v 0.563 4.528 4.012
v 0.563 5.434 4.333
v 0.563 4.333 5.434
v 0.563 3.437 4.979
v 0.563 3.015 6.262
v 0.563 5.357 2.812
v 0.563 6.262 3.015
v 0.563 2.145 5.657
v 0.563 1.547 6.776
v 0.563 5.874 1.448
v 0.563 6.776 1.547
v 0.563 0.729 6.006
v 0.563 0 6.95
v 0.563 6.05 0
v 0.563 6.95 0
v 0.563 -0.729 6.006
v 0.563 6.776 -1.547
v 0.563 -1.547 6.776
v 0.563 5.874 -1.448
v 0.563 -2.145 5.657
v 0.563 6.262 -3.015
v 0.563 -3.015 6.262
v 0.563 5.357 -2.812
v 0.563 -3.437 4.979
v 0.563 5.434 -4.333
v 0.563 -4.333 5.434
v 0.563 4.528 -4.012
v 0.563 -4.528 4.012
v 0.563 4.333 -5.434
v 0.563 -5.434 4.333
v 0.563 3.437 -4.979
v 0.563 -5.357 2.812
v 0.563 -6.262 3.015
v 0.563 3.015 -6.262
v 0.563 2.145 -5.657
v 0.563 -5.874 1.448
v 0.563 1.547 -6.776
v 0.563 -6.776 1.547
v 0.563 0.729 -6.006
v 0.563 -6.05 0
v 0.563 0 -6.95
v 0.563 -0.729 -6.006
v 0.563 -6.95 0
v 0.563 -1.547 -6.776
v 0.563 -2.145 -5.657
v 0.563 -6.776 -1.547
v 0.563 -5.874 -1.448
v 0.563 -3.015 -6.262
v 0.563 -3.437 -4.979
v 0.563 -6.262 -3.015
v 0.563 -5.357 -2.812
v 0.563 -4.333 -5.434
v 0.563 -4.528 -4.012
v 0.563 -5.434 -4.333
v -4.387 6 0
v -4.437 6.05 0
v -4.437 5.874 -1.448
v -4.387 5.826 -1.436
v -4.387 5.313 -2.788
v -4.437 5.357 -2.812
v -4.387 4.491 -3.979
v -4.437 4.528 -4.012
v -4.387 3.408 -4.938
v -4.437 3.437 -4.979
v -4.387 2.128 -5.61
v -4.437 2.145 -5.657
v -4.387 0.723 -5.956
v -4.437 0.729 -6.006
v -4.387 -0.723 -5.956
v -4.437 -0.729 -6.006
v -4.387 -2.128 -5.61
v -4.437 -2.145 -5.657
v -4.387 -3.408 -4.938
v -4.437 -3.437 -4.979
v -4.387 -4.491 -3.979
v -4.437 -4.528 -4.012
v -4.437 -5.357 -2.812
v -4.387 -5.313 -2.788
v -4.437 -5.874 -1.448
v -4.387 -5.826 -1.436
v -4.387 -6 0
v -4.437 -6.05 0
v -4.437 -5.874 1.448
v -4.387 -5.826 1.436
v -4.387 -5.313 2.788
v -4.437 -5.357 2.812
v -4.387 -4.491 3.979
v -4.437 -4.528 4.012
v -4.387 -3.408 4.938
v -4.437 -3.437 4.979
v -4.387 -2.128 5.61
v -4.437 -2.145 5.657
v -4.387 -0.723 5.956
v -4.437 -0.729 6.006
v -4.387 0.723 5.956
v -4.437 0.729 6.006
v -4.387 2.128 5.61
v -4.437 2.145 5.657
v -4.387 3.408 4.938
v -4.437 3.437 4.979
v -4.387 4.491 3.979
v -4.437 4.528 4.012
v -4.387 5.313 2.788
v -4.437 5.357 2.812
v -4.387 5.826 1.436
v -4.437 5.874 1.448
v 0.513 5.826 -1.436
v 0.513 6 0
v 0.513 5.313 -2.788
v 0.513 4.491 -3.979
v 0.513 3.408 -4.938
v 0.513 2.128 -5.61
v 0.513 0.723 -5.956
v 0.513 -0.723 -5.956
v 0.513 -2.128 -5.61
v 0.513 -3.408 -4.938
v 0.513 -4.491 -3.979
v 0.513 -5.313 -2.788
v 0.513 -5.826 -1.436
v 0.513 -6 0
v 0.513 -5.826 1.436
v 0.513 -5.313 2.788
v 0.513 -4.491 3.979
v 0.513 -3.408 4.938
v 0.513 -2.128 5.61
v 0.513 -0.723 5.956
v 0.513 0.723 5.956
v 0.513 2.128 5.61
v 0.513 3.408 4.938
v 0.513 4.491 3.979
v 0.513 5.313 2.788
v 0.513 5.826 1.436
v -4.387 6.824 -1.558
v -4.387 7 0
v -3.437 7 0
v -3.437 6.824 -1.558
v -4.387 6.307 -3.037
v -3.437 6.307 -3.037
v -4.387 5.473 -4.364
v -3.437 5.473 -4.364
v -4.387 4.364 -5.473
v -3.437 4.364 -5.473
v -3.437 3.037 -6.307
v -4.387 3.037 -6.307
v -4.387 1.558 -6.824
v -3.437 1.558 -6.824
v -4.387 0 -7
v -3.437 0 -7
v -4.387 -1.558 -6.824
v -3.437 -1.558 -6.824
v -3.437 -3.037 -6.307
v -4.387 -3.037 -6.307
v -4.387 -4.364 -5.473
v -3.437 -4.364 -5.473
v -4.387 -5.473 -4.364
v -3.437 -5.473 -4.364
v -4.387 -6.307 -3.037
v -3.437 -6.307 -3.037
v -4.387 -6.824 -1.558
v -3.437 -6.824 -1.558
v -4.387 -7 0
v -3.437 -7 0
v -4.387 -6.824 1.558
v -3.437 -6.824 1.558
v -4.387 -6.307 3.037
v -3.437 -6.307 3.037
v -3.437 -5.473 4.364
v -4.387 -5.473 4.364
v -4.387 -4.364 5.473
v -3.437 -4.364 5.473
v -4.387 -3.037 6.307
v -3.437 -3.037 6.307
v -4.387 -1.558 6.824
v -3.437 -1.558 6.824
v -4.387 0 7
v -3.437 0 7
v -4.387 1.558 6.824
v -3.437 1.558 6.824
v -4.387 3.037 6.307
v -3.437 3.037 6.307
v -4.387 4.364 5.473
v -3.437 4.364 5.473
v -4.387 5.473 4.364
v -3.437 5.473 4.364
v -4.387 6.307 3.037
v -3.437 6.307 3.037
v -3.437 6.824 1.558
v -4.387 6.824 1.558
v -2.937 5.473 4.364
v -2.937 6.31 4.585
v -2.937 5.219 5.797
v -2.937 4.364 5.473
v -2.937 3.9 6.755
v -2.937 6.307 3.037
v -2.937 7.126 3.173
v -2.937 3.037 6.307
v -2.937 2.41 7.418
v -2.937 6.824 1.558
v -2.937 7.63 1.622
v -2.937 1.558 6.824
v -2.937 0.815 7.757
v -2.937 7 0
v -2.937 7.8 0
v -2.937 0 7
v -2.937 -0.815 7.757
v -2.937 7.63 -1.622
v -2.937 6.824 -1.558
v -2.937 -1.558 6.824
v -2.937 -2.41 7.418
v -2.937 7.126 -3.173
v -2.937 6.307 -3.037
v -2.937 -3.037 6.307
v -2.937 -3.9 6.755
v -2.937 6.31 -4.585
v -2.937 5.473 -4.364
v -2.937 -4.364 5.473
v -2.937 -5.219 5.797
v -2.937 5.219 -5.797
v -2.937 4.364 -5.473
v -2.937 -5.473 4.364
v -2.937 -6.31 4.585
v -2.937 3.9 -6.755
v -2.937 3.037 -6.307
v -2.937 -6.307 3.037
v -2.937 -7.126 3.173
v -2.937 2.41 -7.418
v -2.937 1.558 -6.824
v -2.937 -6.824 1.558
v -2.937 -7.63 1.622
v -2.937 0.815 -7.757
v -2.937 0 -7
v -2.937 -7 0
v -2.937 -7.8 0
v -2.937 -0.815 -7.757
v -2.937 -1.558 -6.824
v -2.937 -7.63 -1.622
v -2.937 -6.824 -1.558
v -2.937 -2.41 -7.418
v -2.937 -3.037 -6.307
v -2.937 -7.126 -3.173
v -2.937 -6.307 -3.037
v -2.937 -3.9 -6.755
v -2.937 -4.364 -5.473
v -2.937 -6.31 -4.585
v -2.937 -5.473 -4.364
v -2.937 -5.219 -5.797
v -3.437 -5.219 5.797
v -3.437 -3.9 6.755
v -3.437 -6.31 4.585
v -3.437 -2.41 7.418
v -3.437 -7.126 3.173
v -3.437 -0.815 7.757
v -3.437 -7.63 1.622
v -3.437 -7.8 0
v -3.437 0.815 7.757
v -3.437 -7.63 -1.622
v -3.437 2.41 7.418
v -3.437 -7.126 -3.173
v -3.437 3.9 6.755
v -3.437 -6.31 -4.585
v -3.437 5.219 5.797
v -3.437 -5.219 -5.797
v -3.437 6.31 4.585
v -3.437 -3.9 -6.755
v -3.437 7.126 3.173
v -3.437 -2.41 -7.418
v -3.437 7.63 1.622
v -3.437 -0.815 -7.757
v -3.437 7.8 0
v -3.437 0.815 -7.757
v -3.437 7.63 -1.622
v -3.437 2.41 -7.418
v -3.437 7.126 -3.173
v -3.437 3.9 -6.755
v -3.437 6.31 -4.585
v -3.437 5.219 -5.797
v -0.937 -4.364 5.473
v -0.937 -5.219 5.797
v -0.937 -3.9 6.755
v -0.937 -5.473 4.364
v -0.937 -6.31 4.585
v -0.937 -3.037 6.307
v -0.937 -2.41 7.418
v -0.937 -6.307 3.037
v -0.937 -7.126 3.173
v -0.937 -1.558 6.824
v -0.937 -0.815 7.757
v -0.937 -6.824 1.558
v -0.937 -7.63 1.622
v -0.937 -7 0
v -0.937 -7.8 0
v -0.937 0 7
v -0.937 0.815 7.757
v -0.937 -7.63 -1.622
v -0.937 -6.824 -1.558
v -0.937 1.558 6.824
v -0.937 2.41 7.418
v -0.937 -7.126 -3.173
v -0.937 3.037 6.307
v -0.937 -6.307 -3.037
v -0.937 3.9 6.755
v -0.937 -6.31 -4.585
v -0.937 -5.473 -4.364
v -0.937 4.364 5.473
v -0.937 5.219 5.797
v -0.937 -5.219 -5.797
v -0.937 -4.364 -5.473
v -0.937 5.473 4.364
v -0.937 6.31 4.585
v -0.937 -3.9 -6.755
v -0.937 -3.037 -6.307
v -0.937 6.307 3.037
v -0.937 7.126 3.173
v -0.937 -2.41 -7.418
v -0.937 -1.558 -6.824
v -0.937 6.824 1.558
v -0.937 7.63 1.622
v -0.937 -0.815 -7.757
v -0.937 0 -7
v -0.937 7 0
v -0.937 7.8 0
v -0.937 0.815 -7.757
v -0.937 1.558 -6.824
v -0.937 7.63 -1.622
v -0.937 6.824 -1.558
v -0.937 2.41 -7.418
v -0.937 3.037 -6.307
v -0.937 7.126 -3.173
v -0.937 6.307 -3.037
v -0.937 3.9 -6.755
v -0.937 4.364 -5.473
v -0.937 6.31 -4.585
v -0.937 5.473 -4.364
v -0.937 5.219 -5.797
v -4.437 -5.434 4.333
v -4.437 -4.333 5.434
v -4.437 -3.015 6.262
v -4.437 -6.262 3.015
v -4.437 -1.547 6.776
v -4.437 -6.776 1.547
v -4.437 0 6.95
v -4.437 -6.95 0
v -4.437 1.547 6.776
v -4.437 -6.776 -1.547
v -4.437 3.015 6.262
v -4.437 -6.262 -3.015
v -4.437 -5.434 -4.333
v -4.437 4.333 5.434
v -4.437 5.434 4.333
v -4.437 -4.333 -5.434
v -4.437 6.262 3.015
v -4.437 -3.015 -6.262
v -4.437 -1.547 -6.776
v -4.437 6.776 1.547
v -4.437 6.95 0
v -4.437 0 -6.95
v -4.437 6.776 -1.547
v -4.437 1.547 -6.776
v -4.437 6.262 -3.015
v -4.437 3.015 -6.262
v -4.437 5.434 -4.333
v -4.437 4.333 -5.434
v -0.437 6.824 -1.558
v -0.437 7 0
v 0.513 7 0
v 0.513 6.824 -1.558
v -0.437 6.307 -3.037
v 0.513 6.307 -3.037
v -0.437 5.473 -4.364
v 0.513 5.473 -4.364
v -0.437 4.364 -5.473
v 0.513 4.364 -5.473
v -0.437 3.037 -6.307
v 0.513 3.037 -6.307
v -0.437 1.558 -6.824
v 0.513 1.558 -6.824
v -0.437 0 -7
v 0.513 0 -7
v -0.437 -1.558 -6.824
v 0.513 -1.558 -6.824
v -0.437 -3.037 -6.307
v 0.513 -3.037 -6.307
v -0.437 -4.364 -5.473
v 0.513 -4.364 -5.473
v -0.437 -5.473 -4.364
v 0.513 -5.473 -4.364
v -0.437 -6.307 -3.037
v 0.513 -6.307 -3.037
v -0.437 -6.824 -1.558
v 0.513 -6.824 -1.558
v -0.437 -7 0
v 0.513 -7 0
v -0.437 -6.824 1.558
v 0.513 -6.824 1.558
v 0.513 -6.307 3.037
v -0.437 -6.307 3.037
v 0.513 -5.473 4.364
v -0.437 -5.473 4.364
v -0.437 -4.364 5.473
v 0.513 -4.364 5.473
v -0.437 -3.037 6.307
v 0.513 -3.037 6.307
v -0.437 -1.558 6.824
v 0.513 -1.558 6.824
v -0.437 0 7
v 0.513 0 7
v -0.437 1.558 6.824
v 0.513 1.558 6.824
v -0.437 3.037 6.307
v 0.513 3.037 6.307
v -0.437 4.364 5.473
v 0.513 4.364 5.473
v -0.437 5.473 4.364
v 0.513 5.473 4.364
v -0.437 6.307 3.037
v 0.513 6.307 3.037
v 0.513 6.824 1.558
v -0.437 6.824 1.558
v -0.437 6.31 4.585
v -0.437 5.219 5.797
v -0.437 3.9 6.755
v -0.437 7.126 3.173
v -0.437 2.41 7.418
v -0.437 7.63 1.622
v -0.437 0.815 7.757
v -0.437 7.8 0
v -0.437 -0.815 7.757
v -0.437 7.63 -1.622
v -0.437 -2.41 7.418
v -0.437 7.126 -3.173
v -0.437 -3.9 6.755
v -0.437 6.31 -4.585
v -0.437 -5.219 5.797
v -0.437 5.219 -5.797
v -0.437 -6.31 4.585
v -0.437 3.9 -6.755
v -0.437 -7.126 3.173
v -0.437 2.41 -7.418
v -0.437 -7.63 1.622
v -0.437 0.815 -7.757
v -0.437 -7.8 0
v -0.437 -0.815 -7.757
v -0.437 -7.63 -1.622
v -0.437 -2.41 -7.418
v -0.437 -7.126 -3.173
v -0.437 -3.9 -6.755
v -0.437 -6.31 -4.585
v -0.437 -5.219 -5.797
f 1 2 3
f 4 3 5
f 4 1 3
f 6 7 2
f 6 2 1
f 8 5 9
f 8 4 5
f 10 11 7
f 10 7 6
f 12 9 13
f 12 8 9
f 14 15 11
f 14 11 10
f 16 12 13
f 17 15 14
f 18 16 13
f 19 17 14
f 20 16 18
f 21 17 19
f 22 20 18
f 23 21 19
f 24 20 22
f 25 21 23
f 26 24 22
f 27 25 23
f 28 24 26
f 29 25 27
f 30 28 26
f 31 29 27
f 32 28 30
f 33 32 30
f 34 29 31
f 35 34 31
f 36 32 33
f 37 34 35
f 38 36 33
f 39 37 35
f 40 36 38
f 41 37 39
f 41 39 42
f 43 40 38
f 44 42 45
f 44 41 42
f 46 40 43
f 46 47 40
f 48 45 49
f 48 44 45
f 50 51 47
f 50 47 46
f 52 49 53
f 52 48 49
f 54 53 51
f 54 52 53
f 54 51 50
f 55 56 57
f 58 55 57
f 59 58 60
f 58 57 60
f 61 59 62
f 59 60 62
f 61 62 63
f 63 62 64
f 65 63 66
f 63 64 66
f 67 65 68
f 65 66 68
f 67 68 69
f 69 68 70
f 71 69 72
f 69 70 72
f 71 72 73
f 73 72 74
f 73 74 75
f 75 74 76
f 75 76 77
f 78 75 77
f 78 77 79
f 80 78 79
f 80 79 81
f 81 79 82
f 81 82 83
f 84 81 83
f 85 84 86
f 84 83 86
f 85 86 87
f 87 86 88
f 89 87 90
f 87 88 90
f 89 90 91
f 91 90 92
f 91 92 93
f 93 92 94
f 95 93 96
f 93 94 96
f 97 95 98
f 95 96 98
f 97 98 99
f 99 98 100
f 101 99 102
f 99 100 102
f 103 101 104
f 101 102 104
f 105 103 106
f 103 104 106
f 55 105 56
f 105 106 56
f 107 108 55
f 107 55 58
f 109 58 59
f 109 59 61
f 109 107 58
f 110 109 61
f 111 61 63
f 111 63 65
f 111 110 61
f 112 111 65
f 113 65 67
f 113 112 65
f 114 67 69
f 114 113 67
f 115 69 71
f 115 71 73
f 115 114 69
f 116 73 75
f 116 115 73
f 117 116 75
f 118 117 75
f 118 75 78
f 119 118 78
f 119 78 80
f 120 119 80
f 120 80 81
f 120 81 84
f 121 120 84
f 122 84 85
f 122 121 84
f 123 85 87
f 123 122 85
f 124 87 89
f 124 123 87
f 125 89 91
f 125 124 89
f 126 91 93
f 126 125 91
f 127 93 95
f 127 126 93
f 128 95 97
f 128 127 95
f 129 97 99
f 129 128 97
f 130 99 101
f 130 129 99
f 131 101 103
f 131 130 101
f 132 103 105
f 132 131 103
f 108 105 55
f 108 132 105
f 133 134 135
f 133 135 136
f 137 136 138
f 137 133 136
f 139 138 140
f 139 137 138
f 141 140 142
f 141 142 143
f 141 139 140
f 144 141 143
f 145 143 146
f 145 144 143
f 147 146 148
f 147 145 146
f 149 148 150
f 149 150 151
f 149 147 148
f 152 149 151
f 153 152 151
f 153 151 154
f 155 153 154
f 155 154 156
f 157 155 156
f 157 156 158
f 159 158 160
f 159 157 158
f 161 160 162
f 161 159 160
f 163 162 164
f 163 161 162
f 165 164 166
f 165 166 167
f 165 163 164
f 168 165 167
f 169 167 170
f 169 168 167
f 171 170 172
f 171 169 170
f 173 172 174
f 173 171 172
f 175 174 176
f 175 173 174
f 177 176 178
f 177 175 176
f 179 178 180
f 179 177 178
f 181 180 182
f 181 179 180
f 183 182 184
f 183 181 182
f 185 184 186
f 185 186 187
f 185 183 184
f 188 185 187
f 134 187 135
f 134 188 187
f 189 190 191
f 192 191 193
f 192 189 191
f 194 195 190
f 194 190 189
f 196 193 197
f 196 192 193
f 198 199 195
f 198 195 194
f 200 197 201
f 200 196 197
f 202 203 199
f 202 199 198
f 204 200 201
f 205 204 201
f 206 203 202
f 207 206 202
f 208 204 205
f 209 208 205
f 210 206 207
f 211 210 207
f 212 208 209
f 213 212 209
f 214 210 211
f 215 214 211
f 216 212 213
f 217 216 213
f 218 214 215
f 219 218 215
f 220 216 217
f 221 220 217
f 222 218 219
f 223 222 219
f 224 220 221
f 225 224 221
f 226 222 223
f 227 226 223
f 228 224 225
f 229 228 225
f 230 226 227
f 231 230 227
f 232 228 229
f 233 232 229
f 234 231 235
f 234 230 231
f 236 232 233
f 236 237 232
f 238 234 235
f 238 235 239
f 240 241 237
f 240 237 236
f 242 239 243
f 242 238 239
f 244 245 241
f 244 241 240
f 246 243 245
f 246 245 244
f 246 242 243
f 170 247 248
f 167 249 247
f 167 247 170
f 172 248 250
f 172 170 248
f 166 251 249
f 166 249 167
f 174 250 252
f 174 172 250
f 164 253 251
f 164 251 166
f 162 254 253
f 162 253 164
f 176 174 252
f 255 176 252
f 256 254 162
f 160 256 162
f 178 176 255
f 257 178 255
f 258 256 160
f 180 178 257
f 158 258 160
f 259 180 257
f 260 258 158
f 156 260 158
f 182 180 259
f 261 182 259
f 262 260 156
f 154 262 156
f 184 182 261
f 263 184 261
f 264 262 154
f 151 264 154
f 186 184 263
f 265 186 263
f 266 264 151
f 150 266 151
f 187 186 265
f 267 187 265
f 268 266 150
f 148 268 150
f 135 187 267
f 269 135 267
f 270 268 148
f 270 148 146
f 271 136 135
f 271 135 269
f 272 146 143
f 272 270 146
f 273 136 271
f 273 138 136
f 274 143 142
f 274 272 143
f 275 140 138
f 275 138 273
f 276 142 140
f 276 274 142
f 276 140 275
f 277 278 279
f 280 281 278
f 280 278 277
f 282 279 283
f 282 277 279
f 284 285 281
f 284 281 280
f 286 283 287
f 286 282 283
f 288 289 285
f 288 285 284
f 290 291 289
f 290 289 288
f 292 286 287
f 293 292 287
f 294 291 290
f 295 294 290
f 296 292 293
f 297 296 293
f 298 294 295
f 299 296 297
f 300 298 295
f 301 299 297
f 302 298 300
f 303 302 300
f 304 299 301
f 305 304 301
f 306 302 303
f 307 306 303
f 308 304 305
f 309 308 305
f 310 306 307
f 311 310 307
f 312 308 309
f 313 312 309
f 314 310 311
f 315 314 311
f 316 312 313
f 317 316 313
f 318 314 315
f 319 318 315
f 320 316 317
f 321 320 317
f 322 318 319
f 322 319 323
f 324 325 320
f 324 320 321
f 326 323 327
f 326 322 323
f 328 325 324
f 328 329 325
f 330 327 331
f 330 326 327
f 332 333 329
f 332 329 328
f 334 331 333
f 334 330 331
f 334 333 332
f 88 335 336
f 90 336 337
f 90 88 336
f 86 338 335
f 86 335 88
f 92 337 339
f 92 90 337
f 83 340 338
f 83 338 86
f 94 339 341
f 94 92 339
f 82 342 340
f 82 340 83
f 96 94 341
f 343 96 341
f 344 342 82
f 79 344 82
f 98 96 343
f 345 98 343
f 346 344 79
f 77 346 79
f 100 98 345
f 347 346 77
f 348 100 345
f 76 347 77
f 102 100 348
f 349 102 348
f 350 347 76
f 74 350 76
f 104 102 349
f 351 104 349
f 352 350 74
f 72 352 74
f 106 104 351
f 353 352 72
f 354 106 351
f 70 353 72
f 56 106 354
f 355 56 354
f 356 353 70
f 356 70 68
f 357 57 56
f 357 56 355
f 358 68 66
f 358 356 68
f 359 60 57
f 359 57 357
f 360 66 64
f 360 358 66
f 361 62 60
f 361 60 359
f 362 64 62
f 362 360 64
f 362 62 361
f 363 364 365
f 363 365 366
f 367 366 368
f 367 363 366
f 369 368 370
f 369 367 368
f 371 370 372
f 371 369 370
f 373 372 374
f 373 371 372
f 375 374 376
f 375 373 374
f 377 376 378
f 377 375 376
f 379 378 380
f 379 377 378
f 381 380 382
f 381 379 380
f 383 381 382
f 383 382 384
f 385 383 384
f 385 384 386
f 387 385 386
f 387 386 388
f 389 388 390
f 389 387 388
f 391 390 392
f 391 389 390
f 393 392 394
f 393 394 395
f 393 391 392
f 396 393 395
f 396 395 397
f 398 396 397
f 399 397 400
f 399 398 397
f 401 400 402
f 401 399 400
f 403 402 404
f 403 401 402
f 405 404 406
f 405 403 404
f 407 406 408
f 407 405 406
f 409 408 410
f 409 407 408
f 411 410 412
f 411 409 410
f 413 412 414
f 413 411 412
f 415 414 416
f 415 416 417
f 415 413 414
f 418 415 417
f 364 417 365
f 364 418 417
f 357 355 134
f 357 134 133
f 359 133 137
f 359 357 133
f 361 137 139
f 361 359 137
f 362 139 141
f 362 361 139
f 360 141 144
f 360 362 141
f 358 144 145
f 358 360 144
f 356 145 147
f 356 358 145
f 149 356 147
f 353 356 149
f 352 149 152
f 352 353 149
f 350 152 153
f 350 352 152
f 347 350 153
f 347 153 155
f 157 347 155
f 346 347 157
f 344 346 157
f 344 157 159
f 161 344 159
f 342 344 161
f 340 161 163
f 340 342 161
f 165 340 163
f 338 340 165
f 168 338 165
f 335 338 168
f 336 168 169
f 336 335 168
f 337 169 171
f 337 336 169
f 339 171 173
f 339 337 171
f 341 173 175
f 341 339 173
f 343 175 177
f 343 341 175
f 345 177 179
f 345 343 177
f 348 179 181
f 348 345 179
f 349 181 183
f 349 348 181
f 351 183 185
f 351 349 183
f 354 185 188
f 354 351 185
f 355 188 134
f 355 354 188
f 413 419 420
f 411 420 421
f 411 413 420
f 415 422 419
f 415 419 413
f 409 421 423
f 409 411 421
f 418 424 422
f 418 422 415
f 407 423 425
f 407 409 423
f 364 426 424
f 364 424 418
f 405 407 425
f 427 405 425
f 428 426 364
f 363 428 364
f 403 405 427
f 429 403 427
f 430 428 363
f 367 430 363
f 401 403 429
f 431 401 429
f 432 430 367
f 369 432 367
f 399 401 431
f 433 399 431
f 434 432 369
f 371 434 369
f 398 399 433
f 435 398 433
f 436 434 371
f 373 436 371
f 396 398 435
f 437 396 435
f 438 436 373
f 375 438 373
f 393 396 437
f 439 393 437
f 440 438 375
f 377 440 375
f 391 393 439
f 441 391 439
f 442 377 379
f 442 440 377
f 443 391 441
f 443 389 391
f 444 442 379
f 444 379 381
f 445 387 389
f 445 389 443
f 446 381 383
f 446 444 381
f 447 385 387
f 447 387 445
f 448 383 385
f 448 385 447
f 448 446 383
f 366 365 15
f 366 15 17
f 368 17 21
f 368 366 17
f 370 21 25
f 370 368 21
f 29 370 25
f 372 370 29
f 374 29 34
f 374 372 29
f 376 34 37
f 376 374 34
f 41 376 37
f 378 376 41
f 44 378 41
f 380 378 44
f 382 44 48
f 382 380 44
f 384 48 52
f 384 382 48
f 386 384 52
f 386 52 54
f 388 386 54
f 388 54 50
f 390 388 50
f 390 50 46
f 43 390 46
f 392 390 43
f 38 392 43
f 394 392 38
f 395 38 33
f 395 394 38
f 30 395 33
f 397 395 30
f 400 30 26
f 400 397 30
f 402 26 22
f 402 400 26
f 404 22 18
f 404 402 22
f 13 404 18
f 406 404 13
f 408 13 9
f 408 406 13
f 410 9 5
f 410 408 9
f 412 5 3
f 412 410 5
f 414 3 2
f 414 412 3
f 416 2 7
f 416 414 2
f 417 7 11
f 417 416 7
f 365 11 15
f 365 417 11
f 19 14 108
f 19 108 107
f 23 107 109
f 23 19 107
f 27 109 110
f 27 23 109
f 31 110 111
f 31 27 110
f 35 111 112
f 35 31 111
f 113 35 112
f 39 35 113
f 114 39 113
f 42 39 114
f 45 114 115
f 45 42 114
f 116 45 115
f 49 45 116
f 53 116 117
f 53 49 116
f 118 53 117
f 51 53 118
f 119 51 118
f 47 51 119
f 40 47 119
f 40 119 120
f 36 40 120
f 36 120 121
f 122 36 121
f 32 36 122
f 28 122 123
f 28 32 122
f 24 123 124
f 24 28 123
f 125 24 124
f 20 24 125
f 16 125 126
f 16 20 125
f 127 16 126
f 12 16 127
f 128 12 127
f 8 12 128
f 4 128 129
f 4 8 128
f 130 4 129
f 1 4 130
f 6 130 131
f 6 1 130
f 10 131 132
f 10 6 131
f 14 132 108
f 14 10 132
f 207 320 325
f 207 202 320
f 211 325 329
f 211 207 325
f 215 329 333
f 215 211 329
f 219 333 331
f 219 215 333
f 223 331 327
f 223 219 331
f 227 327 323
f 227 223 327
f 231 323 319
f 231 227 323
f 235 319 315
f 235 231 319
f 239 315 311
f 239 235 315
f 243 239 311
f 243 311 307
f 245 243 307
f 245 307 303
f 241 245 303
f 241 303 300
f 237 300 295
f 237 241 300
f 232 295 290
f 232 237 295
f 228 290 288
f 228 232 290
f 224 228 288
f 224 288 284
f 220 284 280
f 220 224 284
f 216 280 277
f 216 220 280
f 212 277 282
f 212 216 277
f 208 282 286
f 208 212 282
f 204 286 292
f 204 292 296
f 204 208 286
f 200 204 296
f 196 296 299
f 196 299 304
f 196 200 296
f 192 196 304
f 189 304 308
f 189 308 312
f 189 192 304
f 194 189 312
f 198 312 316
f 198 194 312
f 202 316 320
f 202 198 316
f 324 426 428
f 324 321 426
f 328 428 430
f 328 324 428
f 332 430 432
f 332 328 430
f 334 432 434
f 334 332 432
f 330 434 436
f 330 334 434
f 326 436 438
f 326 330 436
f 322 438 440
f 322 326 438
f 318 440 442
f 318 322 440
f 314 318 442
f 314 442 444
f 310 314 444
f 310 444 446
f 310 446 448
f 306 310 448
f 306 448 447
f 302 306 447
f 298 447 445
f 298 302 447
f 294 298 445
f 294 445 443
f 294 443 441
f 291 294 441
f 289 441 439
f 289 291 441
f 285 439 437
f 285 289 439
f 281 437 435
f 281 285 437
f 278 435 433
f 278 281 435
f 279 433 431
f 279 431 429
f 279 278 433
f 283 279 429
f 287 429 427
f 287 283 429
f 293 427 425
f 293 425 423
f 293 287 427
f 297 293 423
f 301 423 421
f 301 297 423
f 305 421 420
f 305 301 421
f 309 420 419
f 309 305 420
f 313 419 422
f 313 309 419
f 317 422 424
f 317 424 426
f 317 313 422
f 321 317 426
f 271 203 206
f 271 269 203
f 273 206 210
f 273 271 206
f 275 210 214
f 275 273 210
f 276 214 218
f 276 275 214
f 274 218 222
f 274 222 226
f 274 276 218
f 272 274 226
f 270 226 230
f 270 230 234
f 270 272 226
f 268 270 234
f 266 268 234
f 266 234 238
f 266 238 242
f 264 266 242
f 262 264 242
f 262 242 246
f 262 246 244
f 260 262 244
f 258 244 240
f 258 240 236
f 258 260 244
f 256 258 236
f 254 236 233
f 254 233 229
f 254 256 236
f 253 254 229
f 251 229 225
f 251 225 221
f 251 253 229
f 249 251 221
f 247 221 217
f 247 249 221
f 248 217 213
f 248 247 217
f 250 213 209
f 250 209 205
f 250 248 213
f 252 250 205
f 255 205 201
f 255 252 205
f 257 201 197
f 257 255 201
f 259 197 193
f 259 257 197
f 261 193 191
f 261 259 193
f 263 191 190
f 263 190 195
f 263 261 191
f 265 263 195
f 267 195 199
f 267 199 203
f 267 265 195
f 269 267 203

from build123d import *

# Parameters (mm, degrees)
SMUSSO1_SIZE = 0.05


with BuildPart() as part:
    # Schizzo1 → Rivoluzione1 (revolve)
    with BuildSketch(Plane.XY):
        Polygon((-4.436619718, 6), (0.563380282, 6), (0.563380282, 7), (-0.436619718, 7), (-0.436619718, 7.8), (-0.936619718, 7.8), (-0.936619718, 7), (-2.936619718, 7), (-2.936619718, 7.8), (-3.436619718, 7.8), (-3.436619718, 7), (-4.436619718, 7), align=None)
    revolve(axis=Axis((0, 0, 0), (-1, 0, 0)))

    # Smusso1
    smusso1_edges = [part.edges().sort_by_distance(p)[0] for p in [
        (0.563380282, -7, 0),
        (0.563380282, -6, 0),
        (-4.436619718, -6, 0),
        (-4.436619718, -7, 0),
    ]]
    chamfer(smusso1_edges, length=SMUSSO1_SIZE)


solid = part.part
